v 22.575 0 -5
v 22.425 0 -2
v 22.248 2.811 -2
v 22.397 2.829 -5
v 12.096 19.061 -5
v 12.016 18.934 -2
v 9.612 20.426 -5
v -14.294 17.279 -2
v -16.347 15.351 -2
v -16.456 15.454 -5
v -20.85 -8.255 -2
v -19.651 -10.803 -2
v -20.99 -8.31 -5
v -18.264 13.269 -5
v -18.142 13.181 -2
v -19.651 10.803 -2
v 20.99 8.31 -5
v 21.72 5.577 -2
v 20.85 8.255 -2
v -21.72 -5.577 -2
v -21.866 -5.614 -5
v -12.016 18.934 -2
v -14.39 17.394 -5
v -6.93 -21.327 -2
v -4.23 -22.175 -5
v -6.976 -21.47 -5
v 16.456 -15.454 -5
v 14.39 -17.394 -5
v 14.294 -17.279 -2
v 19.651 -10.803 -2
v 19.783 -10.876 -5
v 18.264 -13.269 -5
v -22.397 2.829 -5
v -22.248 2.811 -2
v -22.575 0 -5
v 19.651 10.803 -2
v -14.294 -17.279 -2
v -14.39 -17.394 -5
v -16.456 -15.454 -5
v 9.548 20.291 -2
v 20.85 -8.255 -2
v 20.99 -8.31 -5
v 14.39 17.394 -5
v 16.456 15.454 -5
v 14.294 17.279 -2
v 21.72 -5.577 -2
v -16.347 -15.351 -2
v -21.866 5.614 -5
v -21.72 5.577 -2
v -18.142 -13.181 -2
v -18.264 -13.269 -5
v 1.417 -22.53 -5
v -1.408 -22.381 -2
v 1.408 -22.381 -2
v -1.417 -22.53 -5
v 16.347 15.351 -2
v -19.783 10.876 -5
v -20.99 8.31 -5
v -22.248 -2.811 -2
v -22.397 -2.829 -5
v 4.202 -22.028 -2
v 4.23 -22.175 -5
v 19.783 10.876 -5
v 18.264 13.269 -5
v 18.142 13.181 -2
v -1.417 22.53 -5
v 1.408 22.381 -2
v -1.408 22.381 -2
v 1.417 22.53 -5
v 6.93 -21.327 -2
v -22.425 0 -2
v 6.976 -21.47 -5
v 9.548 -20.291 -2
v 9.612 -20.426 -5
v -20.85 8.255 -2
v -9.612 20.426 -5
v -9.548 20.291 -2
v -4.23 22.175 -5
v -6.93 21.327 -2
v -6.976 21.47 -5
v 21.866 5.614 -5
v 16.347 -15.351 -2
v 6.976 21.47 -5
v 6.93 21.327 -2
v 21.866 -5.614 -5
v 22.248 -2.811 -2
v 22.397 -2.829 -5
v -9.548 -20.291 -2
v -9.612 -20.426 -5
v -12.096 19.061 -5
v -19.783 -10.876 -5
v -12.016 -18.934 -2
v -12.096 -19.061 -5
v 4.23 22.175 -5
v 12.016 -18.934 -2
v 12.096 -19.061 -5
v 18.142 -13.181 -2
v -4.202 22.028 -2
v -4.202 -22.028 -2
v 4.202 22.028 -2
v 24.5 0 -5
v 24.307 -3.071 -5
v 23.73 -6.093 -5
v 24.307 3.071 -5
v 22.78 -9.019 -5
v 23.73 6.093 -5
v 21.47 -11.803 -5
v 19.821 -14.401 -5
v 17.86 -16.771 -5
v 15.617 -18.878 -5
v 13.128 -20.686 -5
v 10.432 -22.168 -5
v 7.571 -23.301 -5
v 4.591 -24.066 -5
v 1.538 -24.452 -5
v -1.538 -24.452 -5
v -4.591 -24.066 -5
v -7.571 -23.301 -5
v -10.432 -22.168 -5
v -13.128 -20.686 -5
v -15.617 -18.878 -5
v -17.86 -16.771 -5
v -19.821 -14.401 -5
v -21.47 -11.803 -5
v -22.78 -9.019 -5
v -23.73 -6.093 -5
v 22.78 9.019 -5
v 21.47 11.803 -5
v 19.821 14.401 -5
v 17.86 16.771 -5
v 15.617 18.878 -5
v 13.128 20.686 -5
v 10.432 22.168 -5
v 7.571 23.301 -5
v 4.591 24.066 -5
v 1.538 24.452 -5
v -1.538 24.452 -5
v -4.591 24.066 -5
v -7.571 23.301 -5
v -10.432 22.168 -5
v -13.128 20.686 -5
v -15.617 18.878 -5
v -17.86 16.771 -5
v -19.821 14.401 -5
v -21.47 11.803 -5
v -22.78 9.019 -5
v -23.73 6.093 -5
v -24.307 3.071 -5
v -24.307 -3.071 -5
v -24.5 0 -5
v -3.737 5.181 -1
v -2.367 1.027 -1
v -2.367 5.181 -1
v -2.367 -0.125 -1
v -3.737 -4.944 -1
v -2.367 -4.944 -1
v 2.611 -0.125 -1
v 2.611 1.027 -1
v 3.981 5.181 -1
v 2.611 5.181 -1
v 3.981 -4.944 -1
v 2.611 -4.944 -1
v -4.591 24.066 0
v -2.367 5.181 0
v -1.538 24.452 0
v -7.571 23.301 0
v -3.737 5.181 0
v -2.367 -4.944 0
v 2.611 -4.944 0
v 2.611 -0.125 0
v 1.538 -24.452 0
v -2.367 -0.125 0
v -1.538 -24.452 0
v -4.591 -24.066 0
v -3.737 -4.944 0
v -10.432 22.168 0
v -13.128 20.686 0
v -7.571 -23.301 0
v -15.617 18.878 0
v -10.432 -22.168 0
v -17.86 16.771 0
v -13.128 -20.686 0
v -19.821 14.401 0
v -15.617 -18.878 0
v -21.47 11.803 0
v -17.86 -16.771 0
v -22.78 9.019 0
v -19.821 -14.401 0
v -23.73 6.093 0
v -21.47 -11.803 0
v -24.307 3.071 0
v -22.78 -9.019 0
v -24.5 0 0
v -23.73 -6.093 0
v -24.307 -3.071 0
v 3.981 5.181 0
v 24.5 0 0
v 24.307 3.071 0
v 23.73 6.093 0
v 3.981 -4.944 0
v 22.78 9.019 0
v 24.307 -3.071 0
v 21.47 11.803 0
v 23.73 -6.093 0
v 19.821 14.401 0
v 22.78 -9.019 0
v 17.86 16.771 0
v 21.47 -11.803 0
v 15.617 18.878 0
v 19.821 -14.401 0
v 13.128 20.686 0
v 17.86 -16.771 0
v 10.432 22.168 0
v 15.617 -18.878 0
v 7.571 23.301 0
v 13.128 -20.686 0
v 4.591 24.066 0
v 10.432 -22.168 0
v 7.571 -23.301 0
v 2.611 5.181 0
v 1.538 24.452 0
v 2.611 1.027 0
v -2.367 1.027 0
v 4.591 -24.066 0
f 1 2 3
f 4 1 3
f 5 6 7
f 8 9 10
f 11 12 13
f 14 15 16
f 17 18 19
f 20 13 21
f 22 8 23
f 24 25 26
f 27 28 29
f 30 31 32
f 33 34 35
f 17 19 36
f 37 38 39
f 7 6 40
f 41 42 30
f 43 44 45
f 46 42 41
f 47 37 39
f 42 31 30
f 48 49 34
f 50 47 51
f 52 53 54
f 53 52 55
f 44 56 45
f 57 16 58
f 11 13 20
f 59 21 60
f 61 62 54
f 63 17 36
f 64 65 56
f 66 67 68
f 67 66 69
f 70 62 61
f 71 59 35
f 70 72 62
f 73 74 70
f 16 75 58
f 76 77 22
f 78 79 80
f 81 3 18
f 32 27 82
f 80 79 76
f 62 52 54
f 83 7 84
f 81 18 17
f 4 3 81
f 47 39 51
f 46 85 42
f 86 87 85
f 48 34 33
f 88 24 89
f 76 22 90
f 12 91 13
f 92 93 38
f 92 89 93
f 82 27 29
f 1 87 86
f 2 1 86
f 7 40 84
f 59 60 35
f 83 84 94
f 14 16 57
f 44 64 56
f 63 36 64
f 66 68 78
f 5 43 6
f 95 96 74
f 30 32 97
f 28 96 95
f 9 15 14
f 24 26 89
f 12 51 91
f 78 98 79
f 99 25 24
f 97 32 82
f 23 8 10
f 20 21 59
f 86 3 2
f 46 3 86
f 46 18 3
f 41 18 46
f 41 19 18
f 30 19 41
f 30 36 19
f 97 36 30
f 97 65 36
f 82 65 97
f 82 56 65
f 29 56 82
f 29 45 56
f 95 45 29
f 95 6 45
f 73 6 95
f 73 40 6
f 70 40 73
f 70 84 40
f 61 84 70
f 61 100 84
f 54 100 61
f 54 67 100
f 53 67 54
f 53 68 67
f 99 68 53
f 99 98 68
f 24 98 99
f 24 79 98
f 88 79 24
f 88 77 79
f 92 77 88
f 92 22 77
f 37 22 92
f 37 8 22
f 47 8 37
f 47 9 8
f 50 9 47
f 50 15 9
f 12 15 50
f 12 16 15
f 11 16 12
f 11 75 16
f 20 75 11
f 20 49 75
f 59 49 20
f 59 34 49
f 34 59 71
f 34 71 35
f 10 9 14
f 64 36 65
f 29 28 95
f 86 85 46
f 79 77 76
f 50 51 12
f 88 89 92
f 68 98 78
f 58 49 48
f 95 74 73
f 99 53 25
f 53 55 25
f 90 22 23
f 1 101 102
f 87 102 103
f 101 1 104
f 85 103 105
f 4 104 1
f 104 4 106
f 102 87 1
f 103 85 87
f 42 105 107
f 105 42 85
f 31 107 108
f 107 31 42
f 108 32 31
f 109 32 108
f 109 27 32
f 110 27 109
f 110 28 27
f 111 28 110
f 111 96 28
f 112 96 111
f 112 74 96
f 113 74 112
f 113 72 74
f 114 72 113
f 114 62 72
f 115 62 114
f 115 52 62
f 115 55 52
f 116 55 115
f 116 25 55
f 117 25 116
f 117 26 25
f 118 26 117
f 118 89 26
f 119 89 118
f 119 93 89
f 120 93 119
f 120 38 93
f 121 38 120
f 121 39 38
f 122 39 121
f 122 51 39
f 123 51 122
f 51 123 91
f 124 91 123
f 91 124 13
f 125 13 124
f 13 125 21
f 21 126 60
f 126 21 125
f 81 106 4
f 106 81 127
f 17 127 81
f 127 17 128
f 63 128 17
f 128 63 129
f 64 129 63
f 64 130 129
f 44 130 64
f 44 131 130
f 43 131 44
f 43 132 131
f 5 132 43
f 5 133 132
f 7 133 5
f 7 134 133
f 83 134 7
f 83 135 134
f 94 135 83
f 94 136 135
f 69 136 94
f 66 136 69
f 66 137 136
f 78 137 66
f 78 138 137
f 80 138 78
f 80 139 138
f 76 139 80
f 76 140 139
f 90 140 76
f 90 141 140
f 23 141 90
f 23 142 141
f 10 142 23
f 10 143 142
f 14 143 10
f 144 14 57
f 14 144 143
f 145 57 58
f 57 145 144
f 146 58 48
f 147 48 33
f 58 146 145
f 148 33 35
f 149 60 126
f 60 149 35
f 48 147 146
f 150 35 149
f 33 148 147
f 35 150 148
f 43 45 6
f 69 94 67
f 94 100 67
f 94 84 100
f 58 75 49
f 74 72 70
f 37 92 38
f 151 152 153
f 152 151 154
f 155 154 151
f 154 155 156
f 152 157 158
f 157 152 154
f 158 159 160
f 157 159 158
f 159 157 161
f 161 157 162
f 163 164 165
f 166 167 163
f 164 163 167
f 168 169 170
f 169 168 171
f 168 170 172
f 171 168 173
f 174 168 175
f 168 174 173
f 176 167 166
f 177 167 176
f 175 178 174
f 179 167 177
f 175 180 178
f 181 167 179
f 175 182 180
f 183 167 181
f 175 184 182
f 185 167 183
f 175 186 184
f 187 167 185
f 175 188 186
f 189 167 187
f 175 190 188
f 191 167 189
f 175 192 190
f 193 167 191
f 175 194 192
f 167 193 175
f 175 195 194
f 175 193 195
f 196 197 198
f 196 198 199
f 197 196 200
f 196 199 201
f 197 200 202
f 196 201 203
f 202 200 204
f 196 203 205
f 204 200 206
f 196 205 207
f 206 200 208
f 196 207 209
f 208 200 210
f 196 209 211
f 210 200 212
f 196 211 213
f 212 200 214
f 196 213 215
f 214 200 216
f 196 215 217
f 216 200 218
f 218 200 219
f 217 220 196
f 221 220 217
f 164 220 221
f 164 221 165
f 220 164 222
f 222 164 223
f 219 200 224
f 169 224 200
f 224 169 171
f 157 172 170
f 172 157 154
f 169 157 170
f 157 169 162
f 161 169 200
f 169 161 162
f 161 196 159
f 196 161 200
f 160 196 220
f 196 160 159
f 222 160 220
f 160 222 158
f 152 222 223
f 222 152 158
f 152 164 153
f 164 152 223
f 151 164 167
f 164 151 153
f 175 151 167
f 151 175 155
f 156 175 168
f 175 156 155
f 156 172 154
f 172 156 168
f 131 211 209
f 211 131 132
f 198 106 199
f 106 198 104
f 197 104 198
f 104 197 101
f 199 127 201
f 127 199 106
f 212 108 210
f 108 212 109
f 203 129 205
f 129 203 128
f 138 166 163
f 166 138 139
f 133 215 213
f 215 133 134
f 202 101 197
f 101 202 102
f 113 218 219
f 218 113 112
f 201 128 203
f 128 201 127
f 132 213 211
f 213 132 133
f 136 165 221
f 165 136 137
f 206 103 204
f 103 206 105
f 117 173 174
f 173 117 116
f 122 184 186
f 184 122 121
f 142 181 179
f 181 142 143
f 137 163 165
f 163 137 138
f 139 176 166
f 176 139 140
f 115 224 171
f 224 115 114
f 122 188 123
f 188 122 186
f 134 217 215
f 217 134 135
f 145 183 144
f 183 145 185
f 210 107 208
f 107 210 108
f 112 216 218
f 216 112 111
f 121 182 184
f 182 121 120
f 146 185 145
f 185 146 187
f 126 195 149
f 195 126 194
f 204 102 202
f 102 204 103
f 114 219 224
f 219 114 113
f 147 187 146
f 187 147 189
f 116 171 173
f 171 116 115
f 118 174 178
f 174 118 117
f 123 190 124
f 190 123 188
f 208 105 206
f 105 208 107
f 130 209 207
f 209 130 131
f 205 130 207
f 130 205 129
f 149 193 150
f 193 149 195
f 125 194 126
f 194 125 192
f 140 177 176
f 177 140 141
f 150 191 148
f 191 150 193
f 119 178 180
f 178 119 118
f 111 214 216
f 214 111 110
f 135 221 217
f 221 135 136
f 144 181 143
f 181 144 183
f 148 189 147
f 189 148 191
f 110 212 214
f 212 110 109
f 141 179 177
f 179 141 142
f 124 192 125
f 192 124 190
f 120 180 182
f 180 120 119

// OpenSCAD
$fn = 50;

difference() {
	union() {
		translate(v = [0, 0, -5.0]) {
			cylinder(h = 5, r = 24.5);
		}
	}
	union() {
		#translate(v = [0, 0, -5.0]) {
			cylinder(h = 3, r1 = 22.575, r2 = 22.425);
		}
		translate(v = [0, 0, -1]) {
			linear_extrude(height = 1) {
				text(font = "Impact", halign = "center", size = 10, text = "H", valign = "center");
			}
		}
	}
}
